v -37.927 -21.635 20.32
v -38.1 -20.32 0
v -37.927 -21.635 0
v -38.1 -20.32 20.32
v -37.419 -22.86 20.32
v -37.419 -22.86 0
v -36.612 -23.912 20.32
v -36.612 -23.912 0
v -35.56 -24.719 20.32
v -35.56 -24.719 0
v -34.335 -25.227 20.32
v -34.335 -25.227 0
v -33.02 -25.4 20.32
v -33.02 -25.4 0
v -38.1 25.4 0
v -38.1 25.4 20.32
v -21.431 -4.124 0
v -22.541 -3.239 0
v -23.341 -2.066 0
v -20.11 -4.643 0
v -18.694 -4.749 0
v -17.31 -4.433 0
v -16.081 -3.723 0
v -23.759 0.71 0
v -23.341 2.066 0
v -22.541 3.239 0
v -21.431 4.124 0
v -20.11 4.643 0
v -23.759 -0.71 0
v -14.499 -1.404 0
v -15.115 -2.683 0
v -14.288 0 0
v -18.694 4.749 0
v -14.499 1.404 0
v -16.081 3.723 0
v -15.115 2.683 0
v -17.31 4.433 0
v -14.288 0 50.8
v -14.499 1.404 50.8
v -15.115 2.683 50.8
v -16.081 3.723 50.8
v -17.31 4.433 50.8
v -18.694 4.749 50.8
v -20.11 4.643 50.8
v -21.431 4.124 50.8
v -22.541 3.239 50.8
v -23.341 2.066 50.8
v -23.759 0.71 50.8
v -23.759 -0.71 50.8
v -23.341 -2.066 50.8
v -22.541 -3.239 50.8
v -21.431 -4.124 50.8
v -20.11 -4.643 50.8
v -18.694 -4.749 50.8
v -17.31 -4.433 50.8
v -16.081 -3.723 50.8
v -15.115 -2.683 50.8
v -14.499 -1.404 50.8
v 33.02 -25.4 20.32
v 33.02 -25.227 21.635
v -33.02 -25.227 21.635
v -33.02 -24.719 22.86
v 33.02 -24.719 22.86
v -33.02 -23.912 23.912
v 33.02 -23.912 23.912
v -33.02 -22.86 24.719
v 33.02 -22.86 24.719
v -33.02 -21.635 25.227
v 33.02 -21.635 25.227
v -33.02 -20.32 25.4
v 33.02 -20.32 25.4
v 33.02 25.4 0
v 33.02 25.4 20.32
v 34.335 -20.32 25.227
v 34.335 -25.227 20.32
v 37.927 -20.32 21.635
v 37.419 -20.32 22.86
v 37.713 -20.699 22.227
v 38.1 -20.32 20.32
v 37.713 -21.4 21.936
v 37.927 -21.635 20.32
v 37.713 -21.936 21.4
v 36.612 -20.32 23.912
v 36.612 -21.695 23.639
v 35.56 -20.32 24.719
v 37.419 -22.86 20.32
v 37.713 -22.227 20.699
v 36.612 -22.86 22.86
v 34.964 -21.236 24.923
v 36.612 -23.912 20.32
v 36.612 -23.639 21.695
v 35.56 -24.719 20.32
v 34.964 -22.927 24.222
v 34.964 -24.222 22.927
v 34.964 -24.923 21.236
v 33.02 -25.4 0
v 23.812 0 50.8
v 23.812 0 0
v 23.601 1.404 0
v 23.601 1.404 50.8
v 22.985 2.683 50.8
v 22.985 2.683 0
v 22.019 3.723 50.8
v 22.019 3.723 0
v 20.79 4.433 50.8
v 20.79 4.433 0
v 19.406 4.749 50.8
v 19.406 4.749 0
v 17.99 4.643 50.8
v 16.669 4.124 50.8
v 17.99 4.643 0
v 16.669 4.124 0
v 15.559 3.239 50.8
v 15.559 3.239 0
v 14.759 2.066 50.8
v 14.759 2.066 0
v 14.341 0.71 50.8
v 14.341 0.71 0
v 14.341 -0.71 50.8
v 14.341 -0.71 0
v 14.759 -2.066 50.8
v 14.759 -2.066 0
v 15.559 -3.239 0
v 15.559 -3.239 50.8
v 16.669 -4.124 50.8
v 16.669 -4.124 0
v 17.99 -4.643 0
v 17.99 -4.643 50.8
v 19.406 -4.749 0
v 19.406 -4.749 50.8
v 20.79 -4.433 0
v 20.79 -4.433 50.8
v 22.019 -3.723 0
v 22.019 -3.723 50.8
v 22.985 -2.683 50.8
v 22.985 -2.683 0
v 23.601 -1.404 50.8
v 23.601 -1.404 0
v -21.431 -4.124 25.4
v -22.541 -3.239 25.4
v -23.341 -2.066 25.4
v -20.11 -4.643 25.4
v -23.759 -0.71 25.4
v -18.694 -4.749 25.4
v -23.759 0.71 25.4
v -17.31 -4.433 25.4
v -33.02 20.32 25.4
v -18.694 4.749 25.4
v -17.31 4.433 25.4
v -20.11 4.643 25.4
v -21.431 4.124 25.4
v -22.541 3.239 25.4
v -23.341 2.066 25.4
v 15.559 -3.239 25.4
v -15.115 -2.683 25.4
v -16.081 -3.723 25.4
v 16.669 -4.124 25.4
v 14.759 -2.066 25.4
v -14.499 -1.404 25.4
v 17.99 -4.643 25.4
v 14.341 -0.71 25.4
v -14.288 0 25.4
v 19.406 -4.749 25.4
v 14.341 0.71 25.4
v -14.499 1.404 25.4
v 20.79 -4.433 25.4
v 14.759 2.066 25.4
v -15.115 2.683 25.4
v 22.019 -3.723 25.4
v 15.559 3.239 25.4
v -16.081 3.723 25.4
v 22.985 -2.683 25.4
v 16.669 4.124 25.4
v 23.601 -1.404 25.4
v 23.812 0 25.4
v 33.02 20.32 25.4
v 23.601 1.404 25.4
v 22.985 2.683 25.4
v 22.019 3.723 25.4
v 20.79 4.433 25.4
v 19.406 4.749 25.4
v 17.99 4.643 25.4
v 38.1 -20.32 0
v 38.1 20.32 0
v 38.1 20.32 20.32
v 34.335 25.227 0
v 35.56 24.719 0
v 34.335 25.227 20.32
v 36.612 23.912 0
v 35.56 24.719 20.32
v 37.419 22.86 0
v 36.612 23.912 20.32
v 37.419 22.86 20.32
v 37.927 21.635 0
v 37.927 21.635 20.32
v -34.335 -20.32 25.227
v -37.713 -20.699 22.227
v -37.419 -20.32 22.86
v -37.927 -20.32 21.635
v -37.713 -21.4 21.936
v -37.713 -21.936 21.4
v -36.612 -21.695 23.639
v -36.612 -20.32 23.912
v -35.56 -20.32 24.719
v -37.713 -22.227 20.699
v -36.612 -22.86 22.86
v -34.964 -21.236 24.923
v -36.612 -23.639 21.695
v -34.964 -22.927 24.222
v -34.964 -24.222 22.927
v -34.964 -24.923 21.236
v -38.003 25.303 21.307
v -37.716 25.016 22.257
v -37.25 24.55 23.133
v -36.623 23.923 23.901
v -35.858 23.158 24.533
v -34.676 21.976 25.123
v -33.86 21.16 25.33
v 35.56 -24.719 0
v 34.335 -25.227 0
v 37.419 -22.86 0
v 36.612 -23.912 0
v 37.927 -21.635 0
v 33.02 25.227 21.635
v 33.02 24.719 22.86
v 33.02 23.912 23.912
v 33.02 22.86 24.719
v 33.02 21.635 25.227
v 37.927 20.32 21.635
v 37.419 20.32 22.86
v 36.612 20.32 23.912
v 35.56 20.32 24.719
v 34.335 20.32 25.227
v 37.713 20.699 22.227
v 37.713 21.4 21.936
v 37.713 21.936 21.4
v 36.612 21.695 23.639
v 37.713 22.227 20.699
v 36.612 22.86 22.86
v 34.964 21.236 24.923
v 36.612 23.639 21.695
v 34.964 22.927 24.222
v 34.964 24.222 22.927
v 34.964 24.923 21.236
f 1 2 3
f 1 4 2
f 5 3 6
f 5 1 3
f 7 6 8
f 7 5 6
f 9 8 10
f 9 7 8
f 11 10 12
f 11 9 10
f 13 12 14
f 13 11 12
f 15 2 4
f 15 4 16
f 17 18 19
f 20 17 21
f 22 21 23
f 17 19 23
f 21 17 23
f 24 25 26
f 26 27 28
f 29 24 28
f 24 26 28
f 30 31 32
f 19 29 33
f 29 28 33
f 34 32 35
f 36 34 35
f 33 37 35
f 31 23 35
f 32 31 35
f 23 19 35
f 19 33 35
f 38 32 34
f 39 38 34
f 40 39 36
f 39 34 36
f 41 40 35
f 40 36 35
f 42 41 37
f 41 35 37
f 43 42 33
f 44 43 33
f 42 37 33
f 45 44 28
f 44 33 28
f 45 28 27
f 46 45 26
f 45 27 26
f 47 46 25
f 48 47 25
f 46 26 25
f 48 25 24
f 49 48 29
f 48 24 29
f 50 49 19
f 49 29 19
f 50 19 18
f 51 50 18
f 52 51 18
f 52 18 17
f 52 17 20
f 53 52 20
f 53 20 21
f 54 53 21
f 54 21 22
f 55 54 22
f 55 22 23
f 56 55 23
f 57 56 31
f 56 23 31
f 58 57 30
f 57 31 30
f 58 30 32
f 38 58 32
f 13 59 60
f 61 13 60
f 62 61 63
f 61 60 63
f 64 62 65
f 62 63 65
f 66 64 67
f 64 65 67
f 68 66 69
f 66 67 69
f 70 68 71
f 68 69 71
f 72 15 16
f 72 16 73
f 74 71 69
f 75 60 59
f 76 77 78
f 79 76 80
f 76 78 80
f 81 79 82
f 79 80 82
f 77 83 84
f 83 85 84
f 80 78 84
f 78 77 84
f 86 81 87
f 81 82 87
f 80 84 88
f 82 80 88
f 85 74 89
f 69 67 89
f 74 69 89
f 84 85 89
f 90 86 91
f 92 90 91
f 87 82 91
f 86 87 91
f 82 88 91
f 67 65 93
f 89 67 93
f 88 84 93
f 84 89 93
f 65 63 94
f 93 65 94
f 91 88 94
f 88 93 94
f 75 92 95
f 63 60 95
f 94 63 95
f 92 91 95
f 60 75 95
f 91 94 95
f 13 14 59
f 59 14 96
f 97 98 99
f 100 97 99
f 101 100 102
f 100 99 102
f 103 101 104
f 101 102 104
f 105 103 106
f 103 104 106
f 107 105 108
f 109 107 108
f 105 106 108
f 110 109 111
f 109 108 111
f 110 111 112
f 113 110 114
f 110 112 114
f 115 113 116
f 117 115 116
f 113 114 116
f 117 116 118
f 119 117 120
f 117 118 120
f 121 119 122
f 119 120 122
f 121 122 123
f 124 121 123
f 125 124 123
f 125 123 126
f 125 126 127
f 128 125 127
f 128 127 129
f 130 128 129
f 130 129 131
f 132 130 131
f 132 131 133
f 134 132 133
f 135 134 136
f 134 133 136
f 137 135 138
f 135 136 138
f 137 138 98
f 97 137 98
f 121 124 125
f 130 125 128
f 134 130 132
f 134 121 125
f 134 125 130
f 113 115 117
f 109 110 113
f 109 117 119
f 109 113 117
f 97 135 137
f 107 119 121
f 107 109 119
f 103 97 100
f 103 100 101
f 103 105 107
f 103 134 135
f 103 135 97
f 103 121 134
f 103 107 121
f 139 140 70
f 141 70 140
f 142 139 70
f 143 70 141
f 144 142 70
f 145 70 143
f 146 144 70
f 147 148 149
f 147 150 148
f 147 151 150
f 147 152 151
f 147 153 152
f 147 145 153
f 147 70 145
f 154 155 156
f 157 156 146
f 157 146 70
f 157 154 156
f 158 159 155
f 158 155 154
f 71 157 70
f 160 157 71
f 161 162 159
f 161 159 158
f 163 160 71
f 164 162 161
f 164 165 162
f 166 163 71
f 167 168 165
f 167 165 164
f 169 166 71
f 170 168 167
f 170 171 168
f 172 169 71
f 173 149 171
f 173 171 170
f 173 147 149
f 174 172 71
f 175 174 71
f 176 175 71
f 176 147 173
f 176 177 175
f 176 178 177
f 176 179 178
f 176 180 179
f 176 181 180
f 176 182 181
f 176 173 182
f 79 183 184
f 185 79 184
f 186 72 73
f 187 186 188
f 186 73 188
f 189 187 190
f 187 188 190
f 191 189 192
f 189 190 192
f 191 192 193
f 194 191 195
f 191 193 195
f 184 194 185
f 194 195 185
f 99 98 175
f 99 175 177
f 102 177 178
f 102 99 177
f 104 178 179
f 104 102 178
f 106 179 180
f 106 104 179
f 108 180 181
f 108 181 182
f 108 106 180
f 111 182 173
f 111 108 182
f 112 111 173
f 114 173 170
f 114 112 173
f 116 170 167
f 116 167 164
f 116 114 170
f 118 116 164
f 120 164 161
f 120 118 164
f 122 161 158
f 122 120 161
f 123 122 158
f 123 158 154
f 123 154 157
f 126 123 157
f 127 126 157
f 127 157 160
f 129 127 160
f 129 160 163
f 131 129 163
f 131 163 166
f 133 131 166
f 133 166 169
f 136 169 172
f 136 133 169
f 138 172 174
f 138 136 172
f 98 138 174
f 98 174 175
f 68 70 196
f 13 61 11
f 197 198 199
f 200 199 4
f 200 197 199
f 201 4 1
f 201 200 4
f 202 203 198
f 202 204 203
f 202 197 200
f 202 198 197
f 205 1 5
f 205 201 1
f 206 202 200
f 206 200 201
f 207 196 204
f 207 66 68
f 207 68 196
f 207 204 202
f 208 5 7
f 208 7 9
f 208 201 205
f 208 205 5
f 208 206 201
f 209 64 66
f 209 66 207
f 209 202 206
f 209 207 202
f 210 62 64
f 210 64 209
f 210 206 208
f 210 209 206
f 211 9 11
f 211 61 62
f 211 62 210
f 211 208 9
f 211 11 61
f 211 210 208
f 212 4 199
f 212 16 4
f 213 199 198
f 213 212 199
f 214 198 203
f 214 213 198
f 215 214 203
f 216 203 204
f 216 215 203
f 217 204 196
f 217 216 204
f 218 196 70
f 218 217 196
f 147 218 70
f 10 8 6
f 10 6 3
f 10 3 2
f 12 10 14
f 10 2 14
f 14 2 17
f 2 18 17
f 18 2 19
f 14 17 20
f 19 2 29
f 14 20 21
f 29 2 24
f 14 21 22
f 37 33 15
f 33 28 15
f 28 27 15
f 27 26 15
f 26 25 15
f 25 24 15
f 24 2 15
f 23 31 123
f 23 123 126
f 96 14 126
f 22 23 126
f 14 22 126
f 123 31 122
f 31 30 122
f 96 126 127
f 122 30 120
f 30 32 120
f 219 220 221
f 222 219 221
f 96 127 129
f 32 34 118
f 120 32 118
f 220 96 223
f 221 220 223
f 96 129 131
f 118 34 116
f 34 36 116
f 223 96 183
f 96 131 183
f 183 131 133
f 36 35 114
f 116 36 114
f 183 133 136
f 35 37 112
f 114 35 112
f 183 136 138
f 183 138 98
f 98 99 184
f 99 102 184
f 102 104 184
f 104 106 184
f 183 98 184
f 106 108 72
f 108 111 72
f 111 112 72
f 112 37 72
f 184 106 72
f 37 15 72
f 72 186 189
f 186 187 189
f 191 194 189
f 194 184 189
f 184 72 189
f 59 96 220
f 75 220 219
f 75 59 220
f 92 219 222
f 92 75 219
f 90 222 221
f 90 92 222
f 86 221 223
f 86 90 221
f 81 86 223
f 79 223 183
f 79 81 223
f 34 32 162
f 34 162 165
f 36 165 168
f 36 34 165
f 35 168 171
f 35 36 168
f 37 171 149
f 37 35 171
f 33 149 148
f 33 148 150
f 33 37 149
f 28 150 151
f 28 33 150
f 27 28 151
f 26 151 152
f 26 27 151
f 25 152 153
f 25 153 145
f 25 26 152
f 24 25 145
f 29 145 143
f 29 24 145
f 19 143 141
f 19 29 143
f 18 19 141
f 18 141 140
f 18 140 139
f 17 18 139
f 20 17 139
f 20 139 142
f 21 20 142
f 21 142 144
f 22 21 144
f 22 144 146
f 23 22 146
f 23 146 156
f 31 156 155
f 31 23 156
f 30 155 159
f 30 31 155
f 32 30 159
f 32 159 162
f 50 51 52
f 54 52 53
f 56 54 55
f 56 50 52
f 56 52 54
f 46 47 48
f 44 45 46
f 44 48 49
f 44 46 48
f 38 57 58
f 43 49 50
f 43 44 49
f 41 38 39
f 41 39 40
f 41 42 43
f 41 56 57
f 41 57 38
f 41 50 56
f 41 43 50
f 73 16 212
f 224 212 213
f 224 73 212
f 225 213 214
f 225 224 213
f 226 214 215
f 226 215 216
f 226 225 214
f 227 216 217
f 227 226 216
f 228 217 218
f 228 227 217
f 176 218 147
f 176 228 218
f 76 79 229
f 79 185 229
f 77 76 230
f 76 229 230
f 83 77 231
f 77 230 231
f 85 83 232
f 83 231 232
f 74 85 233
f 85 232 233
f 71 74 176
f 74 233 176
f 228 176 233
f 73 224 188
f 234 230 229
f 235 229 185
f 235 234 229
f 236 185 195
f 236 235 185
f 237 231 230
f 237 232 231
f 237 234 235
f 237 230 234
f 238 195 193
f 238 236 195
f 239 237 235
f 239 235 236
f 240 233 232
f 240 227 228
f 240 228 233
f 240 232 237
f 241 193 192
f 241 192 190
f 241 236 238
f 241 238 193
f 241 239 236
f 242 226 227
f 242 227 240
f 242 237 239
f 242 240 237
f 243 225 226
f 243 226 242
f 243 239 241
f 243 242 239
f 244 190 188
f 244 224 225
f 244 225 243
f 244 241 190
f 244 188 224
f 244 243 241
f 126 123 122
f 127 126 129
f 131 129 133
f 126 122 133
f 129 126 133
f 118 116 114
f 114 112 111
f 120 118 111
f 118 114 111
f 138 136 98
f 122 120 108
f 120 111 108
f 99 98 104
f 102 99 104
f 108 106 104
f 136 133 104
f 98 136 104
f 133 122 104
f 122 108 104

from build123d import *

# Parameters (mm, degrees)
F0_W     = 76.2
F0_H     = 50.8
F0_R     = 4.7625
F1_DEPTH = 25.4
F2_DEPTH = 50.8
F3_R     = 5.08


with BuildPart() as f1:
    # F0 (on Top) → F1 (new body)
    with BuildSketch(Plane.XY):
        Rectangle(F0_W, F0_H)
        with Locations((-19.05, 0)):
            Circle(F0_R, mode=Mode.SUBTRACT)
        with Locations((19.05, 0)):
            Circle(F0_R, mode=Mode.SUBTRACT)
    extrude(amount=F1_DEPTH)

    # F3
    f3_edges = [f1.edges().sort_by_distance(p)[0] for p in [
        (0, -25.4, 25.4),
        (-38.1, 0, 25.4),
        (0, 25.4, 25.4),
        (38.1, 0, 25.4),
        (38.1, -25.4, 12.7),
        (-38.1, -25.4, 12.7),
        (38.1, 25.4, 12.7),
    ]]
    fillet(f3_edges, radius=F3_R)


with BuildPart() as f2:
    # F0 (on Top) → F2 (new body)
    with BuildSketch(Plane.XY):
        with Locations((-19.05, 0)):
            Circle(F0_R)
        with Locations((19.05, 0)):
            Circle(F0_R)
    extrude(amount=F2_DEPTH)


solid = Compound([f1.part, f2.part])
